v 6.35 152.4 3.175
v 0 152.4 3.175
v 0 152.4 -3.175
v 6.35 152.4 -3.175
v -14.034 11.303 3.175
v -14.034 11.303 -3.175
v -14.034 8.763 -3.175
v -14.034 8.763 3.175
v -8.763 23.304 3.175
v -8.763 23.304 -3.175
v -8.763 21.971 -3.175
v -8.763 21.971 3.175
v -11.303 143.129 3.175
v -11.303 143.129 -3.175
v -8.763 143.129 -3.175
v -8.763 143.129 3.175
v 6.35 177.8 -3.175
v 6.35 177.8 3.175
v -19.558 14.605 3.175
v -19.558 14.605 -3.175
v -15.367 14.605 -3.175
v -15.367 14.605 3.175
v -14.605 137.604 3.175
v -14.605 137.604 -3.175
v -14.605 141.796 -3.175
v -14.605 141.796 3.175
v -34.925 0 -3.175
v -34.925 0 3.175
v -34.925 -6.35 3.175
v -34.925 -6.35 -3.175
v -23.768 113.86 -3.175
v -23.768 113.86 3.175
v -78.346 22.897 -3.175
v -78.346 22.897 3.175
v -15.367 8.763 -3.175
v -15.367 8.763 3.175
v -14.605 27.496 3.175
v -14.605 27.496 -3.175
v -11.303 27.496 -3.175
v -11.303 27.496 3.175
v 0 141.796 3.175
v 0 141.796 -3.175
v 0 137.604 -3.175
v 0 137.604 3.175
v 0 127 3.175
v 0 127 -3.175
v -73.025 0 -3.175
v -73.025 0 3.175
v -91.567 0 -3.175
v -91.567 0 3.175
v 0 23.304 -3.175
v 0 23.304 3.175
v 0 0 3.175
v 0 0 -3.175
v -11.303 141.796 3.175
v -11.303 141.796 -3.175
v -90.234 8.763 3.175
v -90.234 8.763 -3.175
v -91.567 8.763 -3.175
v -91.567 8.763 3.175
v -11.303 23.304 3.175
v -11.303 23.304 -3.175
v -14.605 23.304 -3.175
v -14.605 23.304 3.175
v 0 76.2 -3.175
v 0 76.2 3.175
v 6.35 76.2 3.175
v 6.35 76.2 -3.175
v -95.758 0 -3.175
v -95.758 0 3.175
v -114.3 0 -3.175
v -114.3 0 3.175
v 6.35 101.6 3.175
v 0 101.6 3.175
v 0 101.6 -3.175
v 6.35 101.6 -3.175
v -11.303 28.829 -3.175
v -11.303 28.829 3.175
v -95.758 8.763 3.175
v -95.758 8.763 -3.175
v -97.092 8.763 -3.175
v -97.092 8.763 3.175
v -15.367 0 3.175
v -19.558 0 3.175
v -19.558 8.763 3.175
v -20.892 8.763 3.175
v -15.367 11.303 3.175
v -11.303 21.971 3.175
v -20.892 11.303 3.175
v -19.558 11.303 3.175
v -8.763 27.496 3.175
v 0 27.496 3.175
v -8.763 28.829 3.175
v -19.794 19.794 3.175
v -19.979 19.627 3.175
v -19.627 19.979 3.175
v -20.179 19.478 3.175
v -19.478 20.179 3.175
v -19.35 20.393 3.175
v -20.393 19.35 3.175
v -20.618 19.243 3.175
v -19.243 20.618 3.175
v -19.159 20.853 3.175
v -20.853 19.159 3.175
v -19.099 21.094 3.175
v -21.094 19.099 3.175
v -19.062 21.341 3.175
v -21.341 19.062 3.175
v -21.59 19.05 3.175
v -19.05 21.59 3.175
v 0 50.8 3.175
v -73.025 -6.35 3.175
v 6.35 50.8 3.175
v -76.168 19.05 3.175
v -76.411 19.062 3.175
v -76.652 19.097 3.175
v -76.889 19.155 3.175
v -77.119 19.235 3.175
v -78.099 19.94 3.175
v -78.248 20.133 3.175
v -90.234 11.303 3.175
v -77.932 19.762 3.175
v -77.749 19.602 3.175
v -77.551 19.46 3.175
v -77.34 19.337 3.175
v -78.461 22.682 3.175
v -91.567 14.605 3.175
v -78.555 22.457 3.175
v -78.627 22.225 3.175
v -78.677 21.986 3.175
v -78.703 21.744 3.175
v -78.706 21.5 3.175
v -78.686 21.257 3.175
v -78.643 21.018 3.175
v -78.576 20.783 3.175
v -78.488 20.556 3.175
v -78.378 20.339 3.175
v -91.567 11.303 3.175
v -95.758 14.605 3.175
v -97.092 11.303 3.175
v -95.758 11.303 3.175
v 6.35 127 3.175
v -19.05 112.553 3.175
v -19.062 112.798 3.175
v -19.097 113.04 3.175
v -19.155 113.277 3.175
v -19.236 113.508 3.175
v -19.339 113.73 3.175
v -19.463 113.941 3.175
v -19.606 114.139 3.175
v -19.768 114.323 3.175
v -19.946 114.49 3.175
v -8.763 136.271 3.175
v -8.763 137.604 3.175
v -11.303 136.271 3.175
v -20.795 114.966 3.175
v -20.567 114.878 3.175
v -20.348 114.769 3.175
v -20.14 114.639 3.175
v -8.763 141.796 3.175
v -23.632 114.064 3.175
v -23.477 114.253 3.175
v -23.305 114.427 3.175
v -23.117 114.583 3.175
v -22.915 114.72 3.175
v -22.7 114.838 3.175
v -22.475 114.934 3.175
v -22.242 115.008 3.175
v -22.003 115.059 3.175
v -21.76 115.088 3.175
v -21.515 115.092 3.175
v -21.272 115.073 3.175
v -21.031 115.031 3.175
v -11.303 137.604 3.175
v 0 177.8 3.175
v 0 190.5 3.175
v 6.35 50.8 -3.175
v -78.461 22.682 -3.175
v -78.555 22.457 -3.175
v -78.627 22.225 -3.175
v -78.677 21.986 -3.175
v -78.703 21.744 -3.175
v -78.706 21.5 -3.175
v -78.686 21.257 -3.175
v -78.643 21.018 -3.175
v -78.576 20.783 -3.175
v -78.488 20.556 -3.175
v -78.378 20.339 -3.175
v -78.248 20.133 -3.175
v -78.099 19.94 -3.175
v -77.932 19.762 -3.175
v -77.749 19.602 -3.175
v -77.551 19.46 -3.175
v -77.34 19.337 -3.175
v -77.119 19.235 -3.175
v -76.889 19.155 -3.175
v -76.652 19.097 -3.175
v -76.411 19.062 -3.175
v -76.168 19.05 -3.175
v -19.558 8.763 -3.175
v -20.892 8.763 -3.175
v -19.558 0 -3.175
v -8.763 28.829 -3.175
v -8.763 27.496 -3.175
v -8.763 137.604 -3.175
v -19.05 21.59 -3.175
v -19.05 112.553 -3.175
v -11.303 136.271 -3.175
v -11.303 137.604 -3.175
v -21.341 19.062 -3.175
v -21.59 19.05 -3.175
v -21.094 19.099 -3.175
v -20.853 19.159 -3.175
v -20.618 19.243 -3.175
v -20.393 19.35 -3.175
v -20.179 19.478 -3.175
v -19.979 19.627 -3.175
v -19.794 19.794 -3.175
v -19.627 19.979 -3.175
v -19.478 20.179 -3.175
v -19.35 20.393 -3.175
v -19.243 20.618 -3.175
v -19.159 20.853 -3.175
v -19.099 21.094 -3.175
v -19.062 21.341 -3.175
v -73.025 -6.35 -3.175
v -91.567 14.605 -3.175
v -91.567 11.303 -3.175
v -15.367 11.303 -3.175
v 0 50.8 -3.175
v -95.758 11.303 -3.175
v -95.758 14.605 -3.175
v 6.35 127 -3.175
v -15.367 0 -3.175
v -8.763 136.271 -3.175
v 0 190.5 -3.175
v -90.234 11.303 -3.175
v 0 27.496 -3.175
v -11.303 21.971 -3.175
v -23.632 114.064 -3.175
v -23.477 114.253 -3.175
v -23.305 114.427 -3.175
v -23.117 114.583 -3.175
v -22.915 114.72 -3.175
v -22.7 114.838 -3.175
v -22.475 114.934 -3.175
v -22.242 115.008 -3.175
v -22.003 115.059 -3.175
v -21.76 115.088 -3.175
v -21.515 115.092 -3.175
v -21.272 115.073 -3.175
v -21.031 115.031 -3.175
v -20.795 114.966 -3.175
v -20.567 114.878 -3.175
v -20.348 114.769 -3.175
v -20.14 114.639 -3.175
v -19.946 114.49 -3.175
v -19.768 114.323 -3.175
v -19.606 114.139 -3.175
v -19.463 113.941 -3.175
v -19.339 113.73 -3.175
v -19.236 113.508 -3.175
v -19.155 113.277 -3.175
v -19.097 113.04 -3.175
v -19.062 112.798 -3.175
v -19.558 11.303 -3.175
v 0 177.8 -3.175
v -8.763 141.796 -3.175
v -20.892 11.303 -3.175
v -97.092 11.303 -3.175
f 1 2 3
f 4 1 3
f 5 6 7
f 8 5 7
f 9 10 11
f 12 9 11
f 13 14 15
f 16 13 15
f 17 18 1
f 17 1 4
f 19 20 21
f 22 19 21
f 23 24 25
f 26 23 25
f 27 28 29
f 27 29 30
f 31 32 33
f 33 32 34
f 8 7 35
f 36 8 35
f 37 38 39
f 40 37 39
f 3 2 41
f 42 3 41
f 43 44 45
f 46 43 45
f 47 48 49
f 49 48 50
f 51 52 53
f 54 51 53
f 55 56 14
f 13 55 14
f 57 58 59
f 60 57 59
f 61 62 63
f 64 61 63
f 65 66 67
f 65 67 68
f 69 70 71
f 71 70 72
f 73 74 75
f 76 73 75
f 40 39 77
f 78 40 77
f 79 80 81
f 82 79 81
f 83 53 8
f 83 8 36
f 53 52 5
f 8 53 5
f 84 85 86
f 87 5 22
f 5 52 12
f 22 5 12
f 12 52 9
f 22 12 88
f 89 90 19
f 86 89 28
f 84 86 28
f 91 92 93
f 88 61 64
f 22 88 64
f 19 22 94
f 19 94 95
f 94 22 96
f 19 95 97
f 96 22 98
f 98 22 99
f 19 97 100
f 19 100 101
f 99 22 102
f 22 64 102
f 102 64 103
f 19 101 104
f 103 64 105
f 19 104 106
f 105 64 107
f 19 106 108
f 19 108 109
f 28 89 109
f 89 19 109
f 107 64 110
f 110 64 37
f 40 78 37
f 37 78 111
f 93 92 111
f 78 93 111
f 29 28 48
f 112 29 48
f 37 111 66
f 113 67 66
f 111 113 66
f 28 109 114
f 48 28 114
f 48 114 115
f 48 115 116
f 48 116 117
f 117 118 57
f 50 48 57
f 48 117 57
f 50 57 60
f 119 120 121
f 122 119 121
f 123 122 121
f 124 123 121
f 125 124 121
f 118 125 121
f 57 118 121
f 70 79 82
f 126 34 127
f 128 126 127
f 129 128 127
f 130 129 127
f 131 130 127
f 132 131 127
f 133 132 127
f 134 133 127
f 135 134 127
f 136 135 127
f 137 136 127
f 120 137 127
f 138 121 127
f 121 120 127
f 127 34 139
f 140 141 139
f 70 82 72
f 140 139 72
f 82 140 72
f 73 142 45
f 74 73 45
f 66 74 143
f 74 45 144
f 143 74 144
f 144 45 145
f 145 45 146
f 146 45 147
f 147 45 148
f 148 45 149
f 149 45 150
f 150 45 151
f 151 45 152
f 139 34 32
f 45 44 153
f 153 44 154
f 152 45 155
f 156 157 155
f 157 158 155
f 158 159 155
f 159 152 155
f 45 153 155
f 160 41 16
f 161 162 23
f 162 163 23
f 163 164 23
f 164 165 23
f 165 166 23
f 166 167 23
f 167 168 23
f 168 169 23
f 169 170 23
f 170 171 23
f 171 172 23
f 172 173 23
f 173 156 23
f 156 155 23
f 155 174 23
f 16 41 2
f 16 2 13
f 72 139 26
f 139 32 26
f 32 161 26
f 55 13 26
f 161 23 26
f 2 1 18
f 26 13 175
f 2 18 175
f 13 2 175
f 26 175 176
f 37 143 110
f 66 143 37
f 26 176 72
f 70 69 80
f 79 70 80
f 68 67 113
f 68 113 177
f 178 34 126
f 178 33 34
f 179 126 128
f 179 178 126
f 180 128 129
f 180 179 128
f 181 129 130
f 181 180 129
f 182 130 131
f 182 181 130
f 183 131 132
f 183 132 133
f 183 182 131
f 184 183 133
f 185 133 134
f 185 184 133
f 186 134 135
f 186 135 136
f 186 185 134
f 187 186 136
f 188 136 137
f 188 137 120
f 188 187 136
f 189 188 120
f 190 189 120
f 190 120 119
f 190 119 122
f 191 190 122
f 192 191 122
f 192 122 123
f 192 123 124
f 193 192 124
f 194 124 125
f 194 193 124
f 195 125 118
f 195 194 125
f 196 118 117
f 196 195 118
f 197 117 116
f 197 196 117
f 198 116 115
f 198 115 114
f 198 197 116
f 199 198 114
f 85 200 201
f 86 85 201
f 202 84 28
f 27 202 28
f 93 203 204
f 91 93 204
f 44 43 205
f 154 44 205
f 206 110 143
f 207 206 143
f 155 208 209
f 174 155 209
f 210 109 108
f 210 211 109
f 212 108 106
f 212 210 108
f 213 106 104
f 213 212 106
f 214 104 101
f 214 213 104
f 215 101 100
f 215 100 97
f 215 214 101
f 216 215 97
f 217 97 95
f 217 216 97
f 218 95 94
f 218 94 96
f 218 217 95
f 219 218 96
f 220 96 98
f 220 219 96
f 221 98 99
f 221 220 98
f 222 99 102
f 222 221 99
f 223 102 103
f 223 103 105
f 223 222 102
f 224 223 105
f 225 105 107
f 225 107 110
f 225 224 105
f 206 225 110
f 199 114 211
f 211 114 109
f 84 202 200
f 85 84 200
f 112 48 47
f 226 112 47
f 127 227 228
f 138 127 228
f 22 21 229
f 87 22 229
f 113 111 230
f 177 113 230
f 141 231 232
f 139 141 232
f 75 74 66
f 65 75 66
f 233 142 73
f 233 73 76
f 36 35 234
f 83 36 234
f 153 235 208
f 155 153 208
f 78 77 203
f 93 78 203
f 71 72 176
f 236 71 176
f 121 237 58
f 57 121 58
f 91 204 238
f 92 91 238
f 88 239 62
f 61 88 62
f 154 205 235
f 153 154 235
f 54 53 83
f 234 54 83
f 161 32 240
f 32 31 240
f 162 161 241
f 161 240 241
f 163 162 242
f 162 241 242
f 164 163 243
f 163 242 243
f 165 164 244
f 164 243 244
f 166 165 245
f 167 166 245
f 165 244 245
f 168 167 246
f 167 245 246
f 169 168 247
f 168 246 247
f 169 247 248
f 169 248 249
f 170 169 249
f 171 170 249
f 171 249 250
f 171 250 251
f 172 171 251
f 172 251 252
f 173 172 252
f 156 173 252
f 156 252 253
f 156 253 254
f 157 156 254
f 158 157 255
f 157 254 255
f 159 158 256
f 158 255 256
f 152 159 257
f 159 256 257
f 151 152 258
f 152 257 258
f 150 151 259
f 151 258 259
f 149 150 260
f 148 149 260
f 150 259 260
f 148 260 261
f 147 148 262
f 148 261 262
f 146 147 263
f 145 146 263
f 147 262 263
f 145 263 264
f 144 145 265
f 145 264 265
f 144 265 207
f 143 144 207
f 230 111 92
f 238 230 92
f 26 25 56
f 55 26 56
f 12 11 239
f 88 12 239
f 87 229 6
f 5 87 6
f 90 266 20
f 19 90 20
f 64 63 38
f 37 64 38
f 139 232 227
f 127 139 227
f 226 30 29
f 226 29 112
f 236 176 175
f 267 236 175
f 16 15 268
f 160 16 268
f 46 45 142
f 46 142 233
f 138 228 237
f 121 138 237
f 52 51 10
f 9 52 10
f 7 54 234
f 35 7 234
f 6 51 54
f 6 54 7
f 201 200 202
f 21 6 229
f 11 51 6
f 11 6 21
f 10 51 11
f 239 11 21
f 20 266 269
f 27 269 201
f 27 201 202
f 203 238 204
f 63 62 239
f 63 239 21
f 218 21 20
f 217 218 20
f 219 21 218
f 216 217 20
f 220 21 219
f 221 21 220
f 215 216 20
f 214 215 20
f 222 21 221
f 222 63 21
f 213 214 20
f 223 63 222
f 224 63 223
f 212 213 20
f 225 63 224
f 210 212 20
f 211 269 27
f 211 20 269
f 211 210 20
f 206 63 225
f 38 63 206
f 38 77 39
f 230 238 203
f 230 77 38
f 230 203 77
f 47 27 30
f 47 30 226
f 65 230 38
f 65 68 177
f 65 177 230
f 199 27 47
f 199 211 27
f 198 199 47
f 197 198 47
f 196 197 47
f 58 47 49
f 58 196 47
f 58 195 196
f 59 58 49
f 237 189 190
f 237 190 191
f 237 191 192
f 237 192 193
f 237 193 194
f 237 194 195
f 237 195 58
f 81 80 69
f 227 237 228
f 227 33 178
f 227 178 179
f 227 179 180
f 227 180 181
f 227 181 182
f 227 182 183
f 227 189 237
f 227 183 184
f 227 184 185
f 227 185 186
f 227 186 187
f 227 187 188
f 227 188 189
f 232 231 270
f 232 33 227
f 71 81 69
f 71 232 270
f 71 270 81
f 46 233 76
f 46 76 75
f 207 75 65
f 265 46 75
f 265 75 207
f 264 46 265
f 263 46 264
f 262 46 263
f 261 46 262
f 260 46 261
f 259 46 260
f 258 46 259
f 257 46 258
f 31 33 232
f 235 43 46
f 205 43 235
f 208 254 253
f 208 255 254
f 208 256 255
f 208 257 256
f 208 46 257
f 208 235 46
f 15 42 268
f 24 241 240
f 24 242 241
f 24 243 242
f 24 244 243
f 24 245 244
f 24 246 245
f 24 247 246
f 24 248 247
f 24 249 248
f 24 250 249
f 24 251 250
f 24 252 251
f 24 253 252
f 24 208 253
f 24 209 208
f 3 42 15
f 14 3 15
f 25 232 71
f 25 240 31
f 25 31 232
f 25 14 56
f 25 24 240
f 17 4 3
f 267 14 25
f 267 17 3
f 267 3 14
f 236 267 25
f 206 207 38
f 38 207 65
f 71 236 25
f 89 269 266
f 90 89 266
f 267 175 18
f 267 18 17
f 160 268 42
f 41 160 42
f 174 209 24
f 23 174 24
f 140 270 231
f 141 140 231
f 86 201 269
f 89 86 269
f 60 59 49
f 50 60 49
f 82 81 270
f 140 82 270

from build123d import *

# Parameters (mm, degrees)
BOSS_EXTRUDE1_DEPTH = 3.175
CUT_EXTRUDE1_DEPTH  = 223.25
SKETCH4_W           = 6.35
SKETCH4_H           = 25.4
BOSS_EXTRUDE2_DEPTH = 6.35
LPATTERN1_COUNT     = 3
LPATTERN1_PITCH     = 50.8
SKETCH5_W           = 38.1
SKETCH5_H           = 6.35
BOSS_EXTRUDE3_DEPTH = 6.35
FILLET1_R           = 2.54
CUT_EXTRUDE2_DEPTH  = 6.35


with BuildPart() as part:
    # Sketch1 → Boss-Extrude1 (new, symmetric)
    with BuildSketch(Plane.XY):
        Polygon((0, 190.5), (0, 0), (-114.3, 0), align=None)
    extrude(amount=BOSS_EXTRUDE1_DEPTH, both=True)

    # Sketch2 → Cut-Extrude1 (cut, through all)
    with BuildSketch(Plane.XY.offset(3.175)):
        Polygon((-80.654073281, 19.05), (-19.05, 19.05), (-19.05, 121.723455468), align=None)
    extrude(amount=-CUT_EXTRUDE1_DEPTH, mode=Mode.SUBTRACT)

    # Sketch4 → Boss-Extrude2 (add)
    with BuildSketch(Plane(origin=(0, 0, 0), x_dir=(0, 0, -1), z_dir=(1, 0, 0))):
        with Locations((0, 165.1)):
            Rectangle(SKETCH4_W, SKETCH4_H)
    boss_extrude2 = extrude(amount=BOSS_EXTRUDE2_DEPTH)

    # LPattern1: Boss-Extrude2 ×3
    with Locations(*[(0, -i * LPATTERN1_PITCH, 0) for i in range(1, LPATTERN1_COUNT)]):
        add(boss_extrude2)

    # Sketch5 → Boss-Extrude3 (add)
    with BuildSketch(Plane(origin=(0, 0, 0), x_dir=(-1, 0, 0), z_dir=(0, -1, 0))):
        with Locations((53.975, 0)):
            Rectangle(SKETCH5_W, SKETCH5_H)
    extrude(amount=BOSS_EXTRUDE3_DEPTH)

    # Fillet1
    fillet1_edges = [part.edges().sort_by_distance(p)[0] for p in [
        (-80.654073281, 19.05, 0),
        (-19.05, 121.723455468, 0),
        (-19.05, 19.05, 0),
    ]]
    fillet(fillet1_edges, radius=FILLET1_R)

    # Sketch3 → Cut-Extrude2 (cut)
    with BuildSketch(Plane(origin=(0, 0, -3.175), x_dir=(-1, 0, 0), z_dir=(0, 0, -1))):
        Polygon((91.567, 0), (95.758, 0), (95.758, 8.763), (97.0915, 8.763), (97.0915, 11.303), (95.758, 11.303), (95.758, 14.605), (91.567, 14.605), (91.567, 11.303), (90.2335, 11.303), (90.2335, 8.763), (91.567, 8.763), align=None)
        Polygon((15.367, 0), (19.558, 0), (19.558, 8.763), (20.8915, 8.763), (20.8915, 11.303), (19.558, 11.303), (19.558, 14.605), (15.367, 14.605), (15.367, 11.303), (14.0335, 11.303), (14.0335, 8.763), (15.367, 8.763), align=None)
        Polygon((0, 141.7955), (0, 137.6045), (8.763, 137.6045), (8.763, 136.271), (11.303, 136.271), (11.303, 137.6045), (14.605, 137.6045), (14.605, 141.7955), (11.303, 141.7955), (11.303, 143.129), (8.763, 143.129), (8.763, 141.7955), align=None)
        Polygon((0, 27.4955), (0, 23.3045), (8.763, 23.3045), (8.763, 21.971), (11.303, 21.971), (11.303, 23.3045), (14.605, 23.3045), (14.605, 27.4955), (11.303, 27.4955), (11.303, 28.829), (8.763, 28.829), (8.763, 27.4955), align=None)
    extrude(amount=-CUT_EXTRUDE2_DEPTH, mode=Mode.SUBTRACT)


solid = part.part
